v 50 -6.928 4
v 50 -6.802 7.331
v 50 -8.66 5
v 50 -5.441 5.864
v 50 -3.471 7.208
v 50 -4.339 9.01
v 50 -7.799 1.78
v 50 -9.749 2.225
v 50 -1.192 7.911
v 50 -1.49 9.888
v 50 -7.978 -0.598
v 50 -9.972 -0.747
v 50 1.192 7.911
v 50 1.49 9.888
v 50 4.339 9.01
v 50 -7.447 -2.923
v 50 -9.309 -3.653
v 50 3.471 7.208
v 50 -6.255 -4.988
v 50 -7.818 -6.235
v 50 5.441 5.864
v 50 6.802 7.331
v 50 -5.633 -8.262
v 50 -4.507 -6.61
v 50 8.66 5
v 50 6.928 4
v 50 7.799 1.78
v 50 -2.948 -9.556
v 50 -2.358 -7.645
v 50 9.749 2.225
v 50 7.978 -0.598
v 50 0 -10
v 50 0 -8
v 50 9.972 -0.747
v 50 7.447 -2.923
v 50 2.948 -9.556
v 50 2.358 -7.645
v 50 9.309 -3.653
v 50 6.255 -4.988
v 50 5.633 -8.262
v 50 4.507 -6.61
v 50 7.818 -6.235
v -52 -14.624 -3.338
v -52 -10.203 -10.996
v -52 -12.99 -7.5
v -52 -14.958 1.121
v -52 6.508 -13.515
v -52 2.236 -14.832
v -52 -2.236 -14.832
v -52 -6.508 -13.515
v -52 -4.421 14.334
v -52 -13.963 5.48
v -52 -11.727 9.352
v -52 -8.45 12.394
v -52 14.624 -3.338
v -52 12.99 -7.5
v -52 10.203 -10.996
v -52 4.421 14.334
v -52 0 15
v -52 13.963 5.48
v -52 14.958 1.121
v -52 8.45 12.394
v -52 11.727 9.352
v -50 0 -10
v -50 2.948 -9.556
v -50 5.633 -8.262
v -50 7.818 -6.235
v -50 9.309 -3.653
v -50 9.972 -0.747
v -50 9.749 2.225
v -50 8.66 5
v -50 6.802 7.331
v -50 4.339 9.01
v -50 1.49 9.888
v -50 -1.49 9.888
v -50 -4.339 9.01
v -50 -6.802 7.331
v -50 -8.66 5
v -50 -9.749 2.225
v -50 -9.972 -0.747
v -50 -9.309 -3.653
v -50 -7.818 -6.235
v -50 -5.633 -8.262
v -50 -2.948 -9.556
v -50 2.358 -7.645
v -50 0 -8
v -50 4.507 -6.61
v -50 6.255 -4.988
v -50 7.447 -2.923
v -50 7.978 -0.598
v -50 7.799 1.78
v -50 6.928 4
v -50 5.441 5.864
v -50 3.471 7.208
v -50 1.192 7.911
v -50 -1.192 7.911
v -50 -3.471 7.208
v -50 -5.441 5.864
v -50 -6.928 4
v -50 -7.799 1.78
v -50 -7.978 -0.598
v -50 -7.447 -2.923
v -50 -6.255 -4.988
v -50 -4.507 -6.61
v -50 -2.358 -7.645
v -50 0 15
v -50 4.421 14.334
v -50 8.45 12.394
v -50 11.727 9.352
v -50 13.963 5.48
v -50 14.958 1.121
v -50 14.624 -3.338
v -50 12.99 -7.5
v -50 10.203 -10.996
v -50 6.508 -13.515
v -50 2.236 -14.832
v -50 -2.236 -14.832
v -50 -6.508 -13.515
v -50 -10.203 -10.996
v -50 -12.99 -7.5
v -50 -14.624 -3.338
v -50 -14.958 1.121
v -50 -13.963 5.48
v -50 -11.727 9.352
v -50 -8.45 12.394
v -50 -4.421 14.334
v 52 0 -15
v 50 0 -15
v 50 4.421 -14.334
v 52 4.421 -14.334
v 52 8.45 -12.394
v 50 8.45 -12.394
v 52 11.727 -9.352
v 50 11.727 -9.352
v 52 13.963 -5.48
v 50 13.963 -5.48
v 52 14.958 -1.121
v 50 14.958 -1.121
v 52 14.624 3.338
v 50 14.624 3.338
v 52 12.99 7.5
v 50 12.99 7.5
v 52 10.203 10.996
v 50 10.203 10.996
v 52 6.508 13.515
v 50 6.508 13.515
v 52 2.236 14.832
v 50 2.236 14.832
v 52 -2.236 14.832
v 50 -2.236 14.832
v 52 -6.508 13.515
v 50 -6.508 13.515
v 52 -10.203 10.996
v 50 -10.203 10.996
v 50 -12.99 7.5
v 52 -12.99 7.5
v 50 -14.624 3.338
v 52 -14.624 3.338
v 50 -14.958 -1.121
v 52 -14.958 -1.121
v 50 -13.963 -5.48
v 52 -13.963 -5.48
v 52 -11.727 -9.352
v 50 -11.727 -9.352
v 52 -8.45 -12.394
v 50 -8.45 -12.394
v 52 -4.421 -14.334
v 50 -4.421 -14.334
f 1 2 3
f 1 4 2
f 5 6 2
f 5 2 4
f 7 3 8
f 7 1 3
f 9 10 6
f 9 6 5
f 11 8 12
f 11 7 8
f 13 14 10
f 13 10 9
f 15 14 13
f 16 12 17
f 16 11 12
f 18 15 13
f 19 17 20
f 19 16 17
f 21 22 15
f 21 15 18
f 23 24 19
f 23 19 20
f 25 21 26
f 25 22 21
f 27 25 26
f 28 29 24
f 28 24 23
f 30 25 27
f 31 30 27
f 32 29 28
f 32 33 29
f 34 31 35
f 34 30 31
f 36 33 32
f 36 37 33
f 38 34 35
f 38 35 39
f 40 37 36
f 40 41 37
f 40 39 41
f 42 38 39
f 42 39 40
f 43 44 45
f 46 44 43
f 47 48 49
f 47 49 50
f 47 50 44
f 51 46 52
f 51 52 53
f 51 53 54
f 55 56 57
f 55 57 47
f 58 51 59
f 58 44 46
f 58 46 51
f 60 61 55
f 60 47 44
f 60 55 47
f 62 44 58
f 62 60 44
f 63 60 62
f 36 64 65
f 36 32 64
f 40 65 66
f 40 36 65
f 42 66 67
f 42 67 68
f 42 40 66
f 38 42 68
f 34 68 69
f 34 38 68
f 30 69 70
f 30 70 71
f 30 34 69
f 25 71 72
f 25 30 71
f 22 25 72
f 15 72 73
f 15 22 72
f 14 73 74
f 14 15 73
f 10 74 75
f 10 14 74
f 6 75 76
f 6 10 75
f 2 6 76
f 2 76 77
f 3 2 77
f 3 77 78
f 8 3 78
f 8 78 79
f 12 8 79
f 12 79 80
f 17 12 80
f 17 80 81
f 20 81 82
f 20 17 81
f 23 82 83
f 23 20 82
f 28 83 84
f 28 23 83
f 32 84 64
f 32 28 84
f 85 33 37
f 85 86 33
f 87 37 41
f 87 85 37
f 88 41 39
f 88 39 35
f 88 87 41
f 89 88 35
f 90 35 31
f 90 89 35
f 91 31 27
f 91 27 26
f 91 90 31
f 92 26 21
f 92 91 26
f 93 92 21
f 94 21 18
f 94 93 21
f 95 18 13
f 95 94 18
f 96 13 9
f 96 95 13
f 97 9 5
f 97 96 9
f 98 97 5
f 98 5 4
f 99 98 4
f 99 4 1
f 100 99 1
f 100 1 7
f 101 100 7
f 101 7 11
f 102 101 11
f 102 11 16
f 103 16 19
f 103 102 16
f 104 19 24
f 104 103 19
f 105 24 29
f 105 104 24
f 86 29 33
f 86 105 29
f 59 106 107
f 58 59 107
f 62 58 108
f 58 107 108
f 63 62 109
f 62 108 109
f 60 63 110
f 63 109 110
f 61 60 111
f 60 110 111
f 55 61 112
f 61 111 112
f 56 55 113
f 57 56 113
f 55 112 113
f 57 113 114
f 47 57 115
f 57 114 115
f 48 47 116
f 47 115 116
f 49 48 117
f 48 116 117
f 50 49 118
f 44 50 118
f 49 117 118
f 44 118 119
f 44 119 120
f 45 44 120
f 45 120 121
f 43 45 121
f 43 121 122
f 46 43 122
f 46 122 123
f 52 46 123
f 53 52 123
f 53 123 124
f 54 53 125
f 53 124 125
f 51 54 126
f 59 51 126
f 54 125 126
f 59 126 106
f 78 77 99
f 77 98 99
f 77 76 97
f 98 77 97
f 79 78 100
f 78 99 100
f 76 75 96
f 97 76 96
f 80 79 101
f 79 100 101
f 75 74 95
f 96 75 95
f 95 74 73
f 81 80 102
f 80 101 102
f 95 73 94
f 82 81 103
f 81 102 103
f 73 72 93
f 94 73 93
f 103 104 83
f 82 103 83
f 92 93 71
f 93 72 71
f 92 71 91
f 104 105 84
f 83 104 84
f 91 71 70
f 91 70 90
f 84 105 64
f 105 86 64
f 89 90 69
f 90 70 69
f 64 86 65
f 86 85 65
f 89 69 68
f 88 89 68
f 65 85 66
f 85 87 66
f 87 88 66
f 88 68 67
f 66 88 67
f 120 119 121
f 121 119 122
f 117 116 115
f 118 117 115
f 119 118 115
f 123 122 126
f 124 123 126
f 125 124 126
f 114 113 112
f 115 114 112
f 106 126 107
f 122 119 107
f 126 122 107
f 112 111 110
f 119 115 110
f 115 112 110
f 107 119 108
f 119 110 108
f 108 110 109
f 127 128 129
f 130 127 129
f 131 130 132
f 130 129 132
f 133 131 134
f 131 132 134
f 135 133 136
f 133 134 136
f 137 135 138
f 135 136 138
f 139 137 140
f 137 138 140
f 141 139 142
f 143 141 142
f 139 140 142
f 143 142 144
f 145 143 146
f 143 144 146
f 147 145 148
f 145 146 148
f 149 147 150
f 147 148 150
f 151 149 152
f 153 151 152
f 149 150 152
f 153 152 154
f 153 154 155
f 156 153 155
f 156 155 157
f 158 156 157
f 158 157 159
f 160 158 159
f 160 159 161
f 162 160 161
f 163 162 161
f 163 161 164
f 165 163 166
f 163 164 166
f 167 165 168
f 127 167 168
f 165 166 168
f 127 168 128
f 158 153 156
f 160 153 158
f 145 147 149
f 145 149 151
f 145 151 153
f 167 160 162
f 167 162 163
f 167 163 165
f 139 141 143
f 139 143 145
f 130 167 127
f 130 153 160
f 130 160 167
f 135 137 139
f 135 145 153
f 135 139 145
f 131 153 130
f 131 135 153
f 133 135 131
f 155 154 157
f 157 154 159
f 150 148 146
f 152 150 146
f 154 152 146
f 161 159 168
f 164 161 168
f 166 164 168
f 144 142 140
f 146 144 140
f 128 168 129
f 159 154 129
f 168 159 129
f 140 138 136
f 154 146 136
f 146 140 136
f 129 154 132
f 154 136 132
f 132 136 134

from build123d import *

# Parameters (mm, degrees)
SKETCH1_R           = 10
SKETCH1_R_2         = 8
BOSS_EXTRUDE1_DEPTH = 50
SKETCH2_R           = 15
BOSS_EXTRUDE2_DEPTH = 2
SKETCH3_R           = 15
BOSS_EXTRUDE3_DEPTH = 2


with BuildPart() as part:
    # Sketch1 → Boss-Extrude1 (new, symmetric)
    with BuildSketch(Plane(origin=(0, 0, 0), x_dir=(0, 0, -1), z_dir=(1, 0, 0))):
        Circle(SKETCH1_R)
        Circle(SKETCH1_R_2, mode=Mode.SUBTRACT)
    extrude(amount=BOSS_EXTRUDE1_DEPTH, both=True)


with BuildPart() as body_2:
    # Sketch2 → Boss-Extrude2 (new body)
    with BuildSketch(Plane(origin=(50, 0, 0), x_dir=(0, 0, -1), z_dir=(1, 0, 0))):
        Circle(SKETCH2_R)
    extrude(amount=BOSS_EXTRUDE2_DEPTH)


with BuildPart() as body_3:
    # Sketch3 → Boss-Extrude3 (new body)
    with BuildSketch(Plane.ZY.offset(50)):
        Circle(SKETCH3_R)
    extrude(amount=BOSS_EXTRUDE3_DEPTH)


solid = Compound([part.part, body_2.part, body_3.part])
